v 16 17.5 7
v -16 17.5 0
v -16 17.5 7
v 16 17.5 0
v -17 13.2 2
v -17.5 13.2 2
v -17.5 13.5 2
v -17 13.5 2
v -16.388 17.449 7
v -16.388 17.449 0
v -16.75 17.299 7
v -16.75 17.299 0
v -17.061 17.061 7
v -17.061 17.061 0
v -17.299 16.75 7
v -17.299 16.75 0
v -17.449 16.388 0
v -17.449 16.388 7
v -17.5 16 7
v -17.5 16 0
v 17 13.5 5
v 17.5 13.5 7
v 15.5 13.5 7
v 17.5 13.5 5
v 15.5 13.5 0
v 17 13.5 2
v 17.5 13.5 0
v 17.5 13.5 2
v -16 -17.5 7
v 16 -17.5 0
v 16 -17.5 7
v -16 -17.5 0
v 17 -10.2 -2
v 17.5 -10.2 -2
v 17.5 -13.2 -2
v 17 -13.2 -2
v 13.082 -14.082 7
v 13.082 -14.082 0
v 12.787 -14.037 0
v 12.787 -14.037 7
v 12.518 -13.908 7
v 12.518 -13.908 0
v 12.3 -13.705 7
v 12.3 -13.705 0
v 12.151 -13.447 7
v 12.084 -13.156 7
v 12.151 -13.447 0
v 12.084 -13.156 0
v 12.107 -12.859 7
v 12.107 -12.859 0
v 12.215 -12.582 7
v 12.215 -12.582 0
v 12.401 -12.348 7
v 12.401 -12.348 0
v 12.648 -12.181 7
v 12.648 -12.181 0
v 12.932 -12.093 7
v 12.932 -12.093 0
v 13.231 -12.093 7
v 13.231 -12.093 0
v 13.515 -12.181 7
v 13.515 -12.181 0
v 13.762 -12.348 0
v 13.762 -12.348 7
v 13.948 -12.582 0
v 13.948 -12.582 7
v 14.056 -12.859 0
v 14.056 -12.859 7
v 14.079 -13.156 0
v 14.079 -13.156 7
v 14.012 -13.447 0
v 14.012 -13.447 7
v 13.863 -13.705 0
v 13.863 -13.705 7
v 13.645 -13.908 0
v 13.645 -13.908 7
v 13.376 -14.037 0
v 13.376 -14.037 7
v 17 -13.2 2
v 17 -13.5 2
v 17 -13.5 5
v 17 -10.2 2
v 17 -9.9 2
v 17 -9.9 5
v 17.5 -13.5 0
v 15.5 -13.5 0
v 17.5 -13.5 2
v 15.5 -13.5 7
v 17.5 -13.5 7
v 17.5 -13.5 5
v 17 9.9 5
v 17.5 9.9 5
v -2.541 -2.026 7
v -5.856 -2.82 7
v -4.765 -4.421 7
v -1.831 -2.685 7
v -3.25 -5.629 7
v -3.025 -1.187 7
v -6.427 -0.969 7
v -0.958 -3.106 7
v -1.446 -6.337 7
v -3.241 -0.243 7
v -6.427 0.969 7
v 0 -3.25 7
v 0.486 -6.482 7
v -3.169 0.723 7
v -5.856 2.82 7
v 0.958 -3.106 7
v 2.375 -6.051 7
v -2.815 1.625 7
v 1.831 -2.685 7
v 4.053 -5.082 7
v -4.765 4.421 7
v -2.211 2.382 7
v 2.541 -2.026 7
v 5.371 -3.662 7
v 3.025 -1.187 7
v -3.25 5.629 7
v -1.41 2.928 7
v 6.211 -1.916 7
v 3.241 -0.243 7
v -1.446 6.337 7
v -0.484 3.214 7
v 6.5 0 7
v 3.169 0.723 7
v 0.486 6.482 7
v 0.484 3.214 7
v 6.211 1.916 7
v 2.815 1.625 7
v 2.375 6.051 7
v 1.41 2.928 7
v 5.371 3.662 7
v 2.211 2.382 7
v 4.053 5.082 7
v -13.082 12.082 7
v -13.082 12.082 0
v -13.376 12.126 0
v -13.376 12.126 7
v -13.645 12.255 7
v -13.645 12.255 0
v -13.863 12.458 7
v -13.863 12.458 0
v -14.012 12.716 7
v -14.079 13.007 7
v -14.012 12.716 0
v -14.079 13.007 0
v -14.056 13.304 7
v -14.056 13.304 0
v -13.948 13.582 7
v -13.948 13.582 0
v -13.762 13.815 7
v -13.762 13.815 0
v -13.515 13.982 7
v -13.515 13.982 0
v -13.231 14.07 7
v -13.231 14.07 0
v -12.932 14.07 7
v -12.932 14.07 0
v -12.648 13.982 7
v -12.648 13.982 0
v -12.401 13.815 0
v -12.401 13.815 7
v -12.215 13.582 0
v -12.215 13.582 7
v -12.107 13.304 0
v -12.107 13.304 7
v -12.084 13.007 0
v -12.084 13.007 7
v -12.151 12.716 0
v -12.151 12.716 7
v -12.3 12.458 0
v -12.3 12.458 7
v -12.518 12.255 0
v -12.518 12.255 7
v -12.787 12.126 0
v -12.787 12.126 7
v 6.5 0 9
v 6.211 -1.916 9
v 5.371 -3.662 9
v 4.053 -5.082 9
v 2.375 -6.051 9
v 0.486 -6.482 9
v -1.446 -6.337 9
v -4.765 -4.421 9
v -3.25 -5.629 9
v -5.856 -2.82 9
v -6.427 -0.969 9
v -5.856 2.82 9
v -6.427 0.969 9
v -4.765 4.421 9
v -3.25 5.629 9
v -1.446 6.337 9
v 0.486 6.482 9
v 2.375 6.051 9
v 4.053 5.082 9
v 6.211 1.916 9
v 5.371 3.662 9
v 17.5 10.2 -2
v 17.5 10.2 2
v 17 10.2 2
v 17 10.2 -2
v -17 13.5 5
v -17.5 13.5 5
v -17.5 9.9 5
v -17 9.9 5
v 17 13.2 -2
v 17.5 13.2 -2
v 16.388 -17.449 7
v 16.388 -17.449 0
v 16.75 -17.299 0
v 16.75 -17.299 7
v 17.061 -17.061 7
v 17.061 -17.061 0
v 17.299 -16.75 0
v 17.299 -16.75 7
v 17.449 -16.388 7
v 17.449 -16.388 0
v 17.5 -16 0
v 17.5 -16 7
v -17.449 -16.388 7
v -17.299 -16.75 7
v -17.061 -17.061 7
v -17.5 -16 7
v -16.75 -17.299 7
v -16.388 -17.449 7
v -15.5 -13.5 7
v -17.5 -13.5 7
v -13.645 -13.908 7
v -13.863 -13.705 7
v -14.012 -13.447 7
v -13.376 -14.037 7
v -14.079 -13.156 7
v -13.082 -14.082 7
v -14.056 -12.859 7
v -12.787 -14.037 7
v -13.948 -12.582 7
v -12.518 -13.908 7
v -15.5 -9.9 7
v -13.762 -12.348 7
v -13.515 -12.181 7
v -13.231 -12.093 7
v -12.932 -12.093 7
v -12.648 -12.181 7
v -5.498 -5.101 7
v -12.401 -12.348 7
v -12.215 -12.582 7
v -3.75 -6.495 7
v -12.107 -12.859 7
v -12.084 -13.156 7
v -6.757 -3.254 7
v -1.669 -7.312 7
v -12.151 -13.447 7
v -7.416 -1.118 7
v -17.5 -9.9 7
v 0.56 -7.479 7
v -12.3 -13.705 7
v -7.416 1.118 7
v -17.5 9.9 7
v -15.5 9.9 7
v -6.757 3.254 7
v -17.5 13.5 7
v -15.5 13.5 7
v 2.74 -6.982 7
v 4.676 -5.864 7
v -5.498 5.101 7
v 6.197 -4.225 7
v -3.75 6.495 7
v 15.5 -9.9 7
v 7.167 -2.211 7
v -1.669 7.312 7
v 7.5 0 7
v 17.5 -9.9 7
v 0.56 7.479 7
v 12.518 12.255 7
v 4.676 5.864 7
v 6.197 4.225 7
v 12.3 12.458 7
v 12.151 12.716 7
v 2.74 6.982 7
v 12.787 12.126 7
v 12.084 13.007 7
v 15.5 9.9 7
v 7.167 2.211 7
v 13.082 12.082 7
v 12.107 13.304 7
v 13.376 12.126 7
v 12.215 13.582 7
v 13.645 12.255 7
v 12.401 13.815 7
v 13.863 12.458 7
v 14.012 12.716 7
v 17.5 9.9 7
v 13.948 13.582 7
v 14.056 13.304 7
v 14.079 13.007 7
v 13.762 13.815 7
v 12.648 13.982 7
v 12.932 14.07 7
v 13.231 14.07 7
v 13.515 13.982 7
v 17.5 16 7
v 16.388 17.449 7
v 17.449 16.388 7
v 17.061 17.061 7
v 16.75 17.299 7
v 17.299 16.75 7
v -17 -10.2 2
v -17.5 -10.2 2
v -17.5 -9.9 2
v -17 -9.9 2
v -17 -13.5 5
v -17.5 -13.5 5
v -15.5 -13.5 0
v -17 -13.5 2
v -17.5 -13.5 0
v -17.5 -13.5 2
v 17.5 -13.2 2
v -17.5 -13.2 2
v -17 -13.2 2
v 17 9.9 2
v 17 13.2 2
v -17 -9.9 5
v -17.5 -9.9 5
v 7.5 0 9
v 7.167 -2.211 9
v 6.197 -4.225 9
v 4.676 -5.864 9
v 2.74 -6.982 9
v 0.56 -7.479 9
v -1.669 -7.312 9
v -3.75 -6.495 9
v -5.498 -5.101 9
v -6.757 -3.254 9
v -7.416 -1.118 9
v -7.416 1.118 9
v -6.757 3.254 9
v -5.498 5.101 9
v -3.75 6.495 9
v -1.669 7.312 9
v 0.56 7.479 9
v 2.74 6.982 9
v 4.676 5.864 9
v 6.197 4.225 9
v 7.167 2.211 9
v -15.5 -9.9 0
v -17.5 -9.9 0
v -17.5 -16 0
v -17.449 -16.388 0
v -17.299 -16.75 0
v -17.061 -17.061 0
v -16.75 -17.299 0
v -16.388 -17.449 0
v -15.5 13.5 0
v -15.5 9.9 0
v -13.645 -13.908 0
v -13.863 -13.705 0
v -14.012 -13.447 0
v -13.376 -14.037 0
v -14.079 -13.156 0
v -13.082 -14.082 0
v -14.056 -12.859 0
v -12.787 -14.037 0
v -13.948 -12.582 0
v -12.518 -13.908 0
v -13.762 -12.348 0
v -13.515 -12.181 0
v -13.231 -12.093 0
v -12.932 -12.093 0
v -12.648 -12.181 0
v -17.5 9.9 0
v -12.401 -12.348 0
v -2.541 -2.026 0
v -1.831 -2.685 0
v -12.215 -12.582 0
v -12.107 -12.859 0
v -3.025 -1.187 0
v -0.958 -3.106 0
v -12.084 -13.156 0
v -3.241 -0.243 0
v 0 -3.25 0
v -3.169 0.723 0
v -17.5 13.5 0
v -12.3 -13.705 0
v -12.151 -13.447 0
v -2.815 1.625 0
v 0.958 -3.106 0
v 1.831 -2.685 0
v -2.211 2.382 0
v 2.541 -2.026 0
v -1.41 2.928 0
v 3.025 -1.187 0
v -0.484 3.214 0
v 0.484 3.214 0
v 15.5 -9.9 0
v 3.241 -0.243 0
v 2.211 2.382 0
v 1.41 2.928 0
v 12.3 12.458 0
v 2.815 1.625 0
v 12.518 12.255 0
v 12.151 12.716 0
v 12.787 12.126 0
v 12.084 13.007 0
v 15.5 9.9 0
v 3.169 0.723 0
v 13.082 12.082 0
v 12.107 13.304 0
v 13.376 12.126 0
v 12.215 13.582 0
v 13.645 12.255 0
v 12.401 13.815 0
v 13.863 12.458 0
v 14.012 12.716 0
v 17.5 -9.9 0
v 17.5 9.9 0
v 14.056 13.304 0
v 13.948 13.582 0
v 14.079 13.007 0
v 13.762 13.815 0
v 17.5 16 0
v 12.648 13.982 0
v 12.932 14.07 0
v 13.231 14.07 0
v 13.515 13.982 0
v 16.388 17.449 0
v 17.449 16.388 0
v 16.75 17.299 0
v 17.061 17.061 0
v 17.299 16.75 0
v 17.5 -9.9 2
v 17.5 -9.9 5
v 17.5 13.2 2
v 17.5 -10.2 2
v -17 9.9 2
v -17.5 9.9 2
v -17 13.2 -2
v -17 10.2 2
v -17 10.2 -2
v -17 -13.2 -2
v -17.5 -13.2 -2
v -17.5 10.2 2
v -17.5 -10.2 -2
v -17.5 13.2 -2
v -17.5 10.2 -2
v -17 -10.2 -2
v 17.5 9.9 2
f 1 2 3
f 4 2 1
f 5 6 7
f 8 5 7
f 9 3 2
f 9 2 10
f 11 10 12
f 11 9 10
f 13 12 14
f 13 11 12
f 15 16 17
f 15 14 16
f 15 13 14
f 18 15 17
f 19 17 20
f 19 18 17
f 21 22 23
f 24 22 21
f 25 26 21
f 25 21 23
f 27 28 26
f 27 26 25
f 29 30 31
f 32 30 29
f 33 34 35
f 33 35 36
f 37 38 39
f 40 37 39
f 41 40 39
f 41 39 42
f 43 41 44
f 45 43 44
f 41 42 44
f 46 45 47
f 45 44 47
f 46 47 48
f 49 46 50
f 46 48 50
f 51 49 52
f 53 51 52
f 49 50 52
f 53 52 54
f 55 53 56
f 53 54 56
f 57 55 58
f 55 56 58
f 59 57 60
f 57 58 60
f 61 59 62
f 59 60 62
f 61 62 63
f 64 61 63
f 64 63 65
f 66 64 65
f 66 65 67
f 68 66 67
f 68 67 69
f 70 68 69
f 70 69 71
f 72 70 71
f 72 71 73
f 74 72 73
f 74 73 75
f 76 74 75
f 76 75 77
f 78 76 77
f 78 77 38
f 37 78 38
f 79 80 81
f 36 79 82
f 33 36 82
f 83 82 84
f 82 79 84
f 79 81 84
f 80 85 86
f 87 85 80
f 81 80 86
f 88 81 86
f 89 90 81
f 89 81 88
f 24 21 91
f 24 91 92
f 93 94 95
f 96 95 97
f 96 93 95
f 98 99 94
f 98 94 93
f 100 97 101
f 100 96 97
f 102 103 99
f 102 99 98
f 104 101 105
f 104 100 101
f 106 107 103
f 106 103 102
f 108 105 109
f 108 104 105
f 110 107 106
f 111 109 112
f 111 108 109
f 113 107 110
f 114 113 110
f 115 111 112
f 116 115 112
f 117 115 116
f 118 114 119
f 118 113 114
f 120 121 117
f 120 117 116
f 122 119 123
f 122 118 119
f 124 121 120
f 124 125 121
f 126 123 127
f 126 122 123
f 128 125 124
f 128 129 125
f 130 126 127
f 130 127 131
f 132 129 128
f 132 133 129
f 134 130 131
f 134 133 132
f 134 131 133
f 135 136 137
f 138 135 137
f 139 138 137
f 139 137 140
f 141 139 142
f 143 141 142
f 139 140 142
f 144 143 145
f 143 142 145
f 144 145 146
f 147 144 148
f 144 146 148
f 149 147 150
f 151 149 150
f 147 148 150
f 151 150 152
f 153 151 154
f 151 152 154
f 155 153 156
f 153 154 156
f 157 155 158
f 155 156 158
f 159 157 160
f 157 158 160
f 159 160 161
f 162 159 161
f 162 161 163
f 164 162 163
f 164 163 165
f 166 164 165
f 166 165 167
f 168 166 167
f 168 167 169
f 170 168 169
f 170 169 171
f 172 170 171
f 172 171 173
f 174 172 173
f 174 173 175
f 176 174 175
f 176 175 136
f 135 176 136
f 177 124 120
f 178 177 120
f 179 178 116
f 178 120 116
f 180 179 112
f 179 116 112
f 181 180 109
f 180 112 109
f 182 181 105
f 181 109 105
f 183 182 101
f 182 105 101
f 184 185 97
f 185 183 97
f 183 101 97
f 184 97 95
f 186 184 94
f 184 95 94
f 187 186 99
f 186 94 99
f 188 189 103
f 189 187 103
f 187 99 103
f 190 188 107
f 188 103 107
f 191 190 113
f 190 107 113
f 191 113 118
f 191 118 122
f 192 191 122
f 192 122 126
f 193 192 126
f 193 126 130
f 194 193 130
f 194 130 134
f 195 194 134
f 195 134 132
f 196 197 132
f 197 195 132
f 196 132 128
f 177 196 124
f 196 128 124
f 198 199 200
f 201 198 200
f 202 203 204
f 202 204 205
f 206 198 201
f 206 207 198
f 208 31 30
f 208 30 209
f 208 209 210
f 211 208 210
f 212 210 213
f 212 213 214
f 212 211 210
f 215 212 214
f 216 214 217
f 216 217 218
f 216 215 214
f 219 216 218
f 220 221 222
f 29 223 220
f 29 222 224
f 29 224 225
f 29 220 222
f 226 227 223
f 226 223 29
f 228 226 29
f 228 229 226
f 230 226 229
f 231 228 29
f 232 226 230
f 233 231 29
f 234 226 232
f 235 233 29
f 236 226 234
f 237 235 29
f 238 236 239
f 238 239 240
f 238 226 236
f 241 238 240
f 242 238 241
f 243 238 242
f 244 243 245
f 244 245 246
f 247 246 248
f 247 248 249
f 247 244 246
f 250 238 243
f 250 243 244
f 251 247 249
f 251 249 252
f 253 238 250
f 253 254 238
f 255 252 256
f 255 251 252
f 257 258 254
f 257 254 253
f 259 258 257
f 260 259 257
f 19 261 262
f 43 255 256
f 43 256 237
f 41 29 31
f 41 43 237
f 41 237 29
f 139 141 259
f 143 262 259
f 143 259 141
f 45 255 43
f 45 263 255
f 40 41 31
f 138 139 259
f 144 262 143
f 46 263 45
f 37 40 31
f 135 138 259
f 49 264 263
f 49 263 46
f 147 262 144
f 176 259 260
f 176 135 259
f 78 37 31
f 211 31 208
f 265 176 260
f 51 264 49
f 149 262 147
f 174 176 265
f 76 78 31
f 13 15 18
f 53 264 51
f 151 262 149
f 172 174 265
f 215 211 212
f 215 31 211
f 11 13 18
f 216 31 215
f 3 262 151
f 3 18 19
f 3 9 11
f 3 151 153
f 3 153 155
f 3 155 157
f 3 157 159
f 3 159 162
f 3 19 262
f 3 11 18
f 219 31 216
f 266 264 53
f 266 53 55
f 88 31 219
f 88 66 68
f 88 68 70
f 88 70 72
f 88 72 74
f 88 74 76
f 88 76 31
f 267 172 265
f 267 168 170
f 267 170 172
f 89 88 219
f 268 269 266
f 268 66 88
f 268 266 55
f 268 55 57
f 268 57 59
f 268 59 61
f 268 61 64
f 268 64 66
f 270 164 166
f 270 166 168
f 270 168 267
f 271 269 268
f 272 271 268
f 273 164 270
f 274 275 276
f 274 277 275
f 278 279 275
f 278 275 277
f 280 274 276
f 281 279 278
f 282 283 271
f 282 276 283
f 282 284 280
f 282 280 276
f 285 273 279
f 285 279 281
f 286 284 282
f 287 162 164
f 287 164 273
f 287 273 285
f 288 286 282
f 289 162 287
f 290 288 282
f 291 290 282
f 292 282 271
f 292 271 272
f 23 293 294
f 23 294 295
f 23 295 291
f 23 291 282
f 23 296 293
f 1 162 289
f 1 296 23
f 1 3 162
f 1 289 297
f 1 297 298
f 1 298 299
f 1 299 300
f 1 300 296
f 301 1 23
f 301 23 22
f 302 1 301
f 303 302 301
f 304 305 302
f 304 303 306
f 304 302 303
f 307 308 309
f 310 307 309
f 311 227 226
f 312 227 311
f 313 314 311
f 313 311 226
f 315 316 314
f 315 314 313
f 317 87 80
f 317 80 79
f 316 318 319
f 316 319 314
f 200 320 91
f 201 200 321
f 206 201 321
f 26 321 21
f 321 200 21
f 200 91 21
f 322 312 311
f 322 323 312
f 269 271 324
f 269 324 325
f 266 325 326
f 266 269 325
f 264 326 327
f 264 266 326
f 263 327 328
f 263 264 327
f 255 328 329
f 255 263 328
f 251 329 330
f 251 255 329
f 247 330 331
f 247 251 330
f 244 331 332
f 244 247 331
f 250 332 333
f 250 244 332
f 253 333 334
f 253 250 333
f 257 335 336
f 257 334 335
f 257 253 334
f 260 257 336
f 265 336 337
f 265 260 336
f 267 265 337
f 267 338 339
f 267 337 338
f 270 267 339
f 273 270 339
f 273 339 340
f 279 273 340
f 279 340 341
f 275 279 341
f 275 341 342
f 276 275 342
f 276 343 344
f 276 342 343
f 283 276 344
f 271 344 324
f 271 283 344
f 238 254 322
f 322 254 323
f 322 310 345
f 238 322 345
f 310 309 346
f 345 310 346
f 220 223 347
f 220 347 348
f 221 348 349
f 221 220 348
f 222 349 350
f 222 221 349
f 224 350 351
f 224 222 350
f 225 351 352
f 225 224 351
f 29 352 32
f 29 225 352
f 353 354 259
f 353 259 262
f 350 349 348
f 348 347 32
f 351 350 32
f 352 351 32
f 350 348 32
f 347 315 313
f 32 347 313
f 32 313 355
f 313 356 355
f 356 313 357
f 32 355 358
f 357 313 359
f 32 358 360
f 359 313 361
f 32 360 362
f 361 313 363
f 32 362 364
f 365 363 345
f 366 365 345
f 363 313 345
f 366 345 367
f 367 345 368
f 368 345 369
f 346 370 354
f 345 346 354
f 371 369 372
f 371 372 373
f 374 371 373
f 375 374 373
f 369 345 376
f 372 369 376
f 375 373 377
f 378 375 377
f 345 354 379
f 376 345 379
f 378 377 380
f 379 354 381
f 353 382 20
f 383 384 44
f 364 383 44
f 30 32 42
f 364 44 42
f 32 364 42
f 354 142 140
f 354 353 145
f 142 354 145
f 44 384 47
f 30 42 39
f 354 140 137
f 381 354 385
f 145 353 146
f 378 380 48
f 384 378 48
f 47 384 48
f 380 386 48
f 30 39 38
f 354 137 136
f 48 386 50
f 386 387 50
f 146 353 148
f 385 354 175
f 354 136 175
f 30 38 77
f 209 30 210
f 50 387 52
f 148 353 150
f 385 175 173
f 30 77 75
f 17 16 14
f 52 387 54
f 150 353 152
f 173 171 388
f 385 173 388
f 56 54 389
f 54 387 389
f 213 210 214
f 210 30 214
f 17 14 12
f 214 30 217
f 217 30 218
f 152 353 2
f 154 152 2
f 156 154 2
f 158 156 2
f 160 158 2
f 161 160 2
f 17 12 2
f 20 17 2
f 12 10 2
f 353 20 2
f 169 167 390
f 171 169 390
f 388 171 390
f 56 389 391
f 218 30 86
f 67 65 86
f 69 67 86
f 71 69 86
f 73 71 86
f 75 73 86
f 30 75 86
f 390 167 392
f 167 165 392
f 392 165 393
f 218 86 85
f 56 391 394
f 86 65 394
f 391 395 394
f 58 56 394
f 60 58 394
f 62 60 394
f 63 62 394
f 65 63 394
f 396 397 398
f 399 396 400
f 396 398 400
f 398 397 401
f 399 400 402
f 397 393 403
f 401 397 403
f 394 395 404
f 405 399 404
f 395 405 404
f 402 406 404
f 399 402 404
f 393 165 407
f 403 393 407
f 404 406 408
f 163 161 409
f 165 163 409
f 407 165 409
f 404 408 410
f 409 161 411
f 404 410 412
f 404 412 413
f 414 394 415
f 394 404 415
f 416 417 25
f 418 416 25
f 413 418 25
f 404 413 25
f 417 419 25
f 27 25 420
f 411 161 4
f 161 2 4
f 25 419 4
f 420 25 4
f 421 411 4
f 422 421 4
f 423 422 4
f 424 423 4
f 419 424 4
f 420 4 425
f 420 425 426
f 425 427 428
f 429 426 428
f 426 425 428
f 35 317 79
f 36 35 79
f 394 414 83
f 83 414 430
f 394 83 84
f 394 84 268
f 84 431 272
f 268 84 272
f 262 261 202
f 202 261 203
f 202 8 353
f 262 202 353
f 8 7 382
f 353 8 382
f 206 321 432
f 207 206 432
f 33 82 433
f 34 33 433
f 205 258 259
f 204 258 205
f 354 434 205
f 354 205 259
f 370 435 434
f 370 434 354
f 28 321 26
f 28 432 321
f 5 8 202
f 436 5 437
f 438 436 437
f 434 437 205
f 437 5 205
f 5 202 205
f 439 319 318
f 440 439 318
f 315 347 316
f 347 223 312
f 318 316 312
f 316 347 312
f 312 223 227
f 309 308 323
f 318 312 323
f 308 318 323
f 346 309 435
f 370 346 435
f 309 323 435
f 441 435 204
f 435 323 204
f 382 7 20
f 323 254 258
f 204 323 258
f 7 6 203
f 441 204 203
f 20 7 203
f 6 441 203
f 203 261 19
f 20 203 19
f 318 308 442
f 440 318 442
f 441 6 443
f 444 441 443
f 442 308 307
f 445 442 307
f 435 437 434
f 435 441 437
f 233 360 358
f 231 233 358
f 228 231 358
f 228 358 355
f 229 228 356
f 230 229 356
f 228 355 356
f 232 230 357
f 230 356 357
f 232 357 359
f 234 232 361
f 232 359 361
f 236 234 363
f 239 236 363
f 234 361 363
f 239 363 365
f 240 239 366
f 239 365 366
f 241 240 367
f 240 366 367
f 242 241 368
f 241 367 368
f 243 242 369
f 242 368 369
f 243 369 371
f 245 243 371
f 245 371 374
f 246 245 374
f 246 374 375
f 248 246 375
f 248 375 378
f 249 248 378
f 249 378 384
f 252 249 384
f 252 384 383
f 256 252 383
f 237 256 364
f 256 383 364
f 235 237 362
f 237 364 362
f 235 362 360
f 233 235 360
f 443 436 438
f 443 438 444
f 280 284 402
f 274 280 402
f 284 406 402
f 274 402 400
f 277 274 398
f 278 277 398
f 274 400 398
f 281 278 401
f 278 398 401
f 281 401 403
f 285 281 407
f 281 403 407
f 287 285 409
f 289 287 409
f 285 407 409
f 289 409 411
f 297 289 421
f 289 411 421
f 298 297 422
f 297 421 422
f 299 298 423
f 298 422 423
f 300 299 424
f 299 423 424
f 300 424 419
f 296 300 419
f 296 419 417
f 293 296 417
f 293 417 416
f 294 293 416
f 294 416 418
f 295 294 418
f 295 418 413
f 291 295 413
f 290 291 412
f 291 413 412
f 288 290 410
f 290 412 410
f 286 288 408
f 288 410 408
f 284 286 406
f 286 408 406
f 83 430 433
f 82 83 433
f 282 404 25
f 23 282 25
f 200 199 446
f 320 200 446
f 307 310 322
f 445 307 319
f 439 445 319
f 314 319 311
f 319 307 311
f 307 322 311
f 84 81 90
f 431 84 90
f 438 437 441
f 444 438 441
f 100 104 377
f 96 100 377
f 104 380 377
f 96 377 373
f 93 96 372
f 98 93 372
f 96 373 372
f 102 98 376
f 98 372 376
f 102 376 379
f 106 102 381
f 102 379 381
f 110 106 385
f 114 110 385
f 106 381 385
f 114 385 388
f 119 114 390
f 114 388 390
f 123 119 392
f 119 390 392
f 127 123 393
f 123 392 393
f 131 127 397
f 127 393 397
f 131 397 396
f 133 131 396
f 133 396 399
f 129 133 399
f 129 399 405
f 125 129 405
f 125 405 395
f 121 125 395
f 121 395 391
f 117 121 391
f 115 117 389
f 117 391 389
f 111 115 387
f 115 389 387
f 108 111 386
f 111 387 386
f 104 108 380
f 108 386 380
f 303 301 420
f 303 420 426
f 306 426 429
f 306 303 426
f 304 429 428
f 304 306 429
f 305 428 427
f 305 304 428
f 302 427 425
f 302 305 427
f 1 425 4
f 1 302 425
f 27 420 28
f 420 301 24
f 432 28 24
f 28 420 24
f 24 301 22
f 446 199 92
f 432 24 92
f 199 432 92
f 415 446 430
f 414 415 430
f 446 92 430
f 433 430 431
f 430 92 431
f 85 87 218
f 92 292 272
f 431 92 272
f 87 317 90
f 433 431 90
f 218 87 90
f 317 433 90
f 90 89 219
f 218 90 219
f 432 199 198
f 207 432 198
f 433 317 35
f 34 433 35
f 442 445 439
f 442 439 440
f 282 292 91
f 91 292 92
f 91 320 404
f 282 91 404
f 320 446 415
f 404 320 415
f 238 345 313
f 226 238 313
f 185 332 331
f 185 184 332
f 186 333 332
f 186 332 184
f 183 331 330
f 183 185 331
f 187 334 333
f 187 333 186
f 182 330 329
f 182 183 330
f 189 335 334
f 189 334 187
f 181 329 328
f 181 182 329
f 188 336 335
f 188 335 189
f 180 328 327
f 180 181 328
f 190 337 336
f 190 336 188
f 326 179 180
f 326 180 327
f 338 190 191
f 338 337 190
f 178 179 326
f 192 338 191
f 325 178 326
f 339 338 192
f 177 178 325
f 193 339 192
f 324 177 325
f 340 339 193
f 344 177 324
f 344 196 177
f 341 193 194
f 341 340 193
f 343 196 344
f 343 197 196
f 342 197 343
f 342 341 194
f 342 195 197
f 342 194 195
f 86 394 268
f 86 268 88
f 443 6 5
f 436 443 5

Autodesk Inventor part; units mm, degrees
ref_plane "YZ Plane" through (0, 0, 0) normal (1, 0, 0) x (0, 1, 0)
ref_plane "XZ Plane" through (0, 0, 0) normal (0, 1, 0) x (-1, 0, 0)
ref_plane "XY Plane" through (0, 0, 0) normal (0, 0, 1) x (1, 0, 0)
sketch "スケッチ1" plane through (0, 0, 0) normal (0, 0, 1) x (1, 0, 0)
  line L0 (-17.5, 17.5) -> (17.5, 17.5)
  line L1 (17.5, 17.5) -> (17.5, -17.5)
  line L2 (17.5, -17.5) -> (-17.5, -17.5)
  line L3 (-17.5, -17.5) -> (-17.5, 17.5)
  point P0 (0, 0)
  dimension "d0" = 35
  dimension "d1" = 35
  dimension "d2" = 17.5
  dimension "d3" = 17.5
extrude "押し出し1" add sketch "スケッチ1" along normal blind 7
sketch "スケッチ2" plane through (0, 0, 7) normal (0, 0, 1) x (1, 0, 0)
  line L0 (-17.5, 17.5) -> (17.5, -17.5)
  line L1 (17.5, 17.5) -> (-17.5, -17.5)
  line L2 (-17.5, -17.5) -> (-17.5, 17.5) projected
  circle A0 centre (0, 0) radius 18.5
  point P0 (-13.0815, 13.0815)
  point P1 (13.0815, 13.0815)
  point P2 (13.0815, -13.0815)
  point P3 (-13.0815, -13.0815)
  dimension "d6" = 37
hole "Hole1" at (-13.0815, 13.0815, 7) at (13.0815, 13.0815, 7) at (13.0815, -13.0815, 7) at (-13.0815, -13.0815, 7) direction (0, 0, -1) diameter 2 end through all
sketch "スケッチ3" plane through (0, 0, 7) normal (0, 0, 1) x (1, 0, 0)
  circle A0 centre (0, 0) radius 7.5
  circle A1 centre (0, 0) radius 6.5
  dimension "d14" = 15
  dimension "d15" = 13
extrude "押し出し2" add sketch "スケッチ3" along normal blind 2
sketch "スケッチ4" plane through (0, 0, 7) normal (0, 0, 1) x (1, 0, 0)
  line L0 (17.5, 17.5) -> (17.5, -17.5) projected
  line L1 (-17.5, 17.5) -> (17.5, 17.5) projected
  line L2 (-17.5, -17.5) -> (-17.5, 17.5) projected
  line L3 (17.5, -17.5) -> (-17.5, -17.5) projected
  line L4 (17.5, 13.5) -> (15.5, 13.5)
  line L5 (15.5, 13.5) -> (15.5, 9.9)
  line L6 (15.5, 9.9) -> (17.5, 9.9)
  line L7 (17.5, 9.9) -> (17.5, 13.5)
  line L8 (17.5, 0) -> (-17.5, 0)
  line L9 (17.5, -17.5) -> (17.5, 17.5)
  line L10 (17.5, -13.5) -> (15.5, -13.5)
  line L11 (15.5, -13.5) -> (15.5, -9.9)
  line L12 (15.5, -9.9) -> (17.5, -9.9)
  line L13 (17.5, -9.9) -> (17.5, -13.5)
  line L14 (0, 17.5) -> (0, -17.5)
  line L15 (-17.5, 17.5) -> (-17.5, -17.5)
  line L16 (-17.5, 13.5) -> (-15.5, 13.5)
  line L17 (-15.5, 13.5) -> (-15.5, 9.9)
  line L18 (-15.5, 9.9) -> (-17.5, 9.9)
  line L19 (-17.5, 9.9) -> (-17.5, 13.5)
  line L20 (-17.5, -17.5) -> (-17.5, 17.5)
  line L21 (-15.5, -13.5) -> (-15.5, -9.9)
  line L22 (-15.5, -9.9) -> (-17.5, -9.9)
  line L23 (-17.5, -9.9) -> (-17.5, -13.5)
  line L24 (-17.5, -13.5) -> (-15.5, -13.5)
  dimension "d18" = 4
  dimension "d19" = 2
  dimension "d20" = 3.6
extrude "押し出し3" cut sketch "スケッチ4" against normal blind 2 contours L0 L6 L5 L4 | L16 L17 L18 L2 | L0 L10 L11 L12 | L22 L21 L24 L2
sketch "スケッチ5" plane through (0, 0, 0) normal (0, 0, -1) x (-1, 0, 0)
  line L0 (17.5, 17.5) -> (-17.5, 17.5) projected
  line L1 (-17.5, 17.5) -> (-17.5, -17.5) projected
  line L2 (-17.5, -17.5) -> (17.5, -17.5) projected
  line L3 (17.5, 0) -> (-17.5, 0)
  line L4 (17.5, 17.5) -> (-17.5, 17.5) projected
  line L5 (0, 17.5) -> (0, -17.5)
  line L6 (15.5, 13.5) -> (17, 13.5)
  line L7 (17, 13.5) -> (17, 9.9)
  line L8 (17, 9.9) -> (15.5, 9.9)
  line L9 (15.5, 9.9) -> (15.5, 13.5)
  line L10 (17.5, -17.5) -> (17.5, 17.5) projected
  line L11 (15.5, -13.5) -> (17, -13.5)
  line L12 (17, -13.5) -> (17, -9.9)
  line L13 (17, -9.9) -> (15.5, -9.9)
  line L14 (15.5, -9.9) -> (15.5, -13.5)
  line L15 (-15.5, 13.5) -> (-17, 13.5)
  line L16 (-17, 13.5) -> (-17, 9.9)
  line L17 (-17, 9.9) -> (-15.5, 9.9)
  line L18 (-15.5, 9.9) -> (-15.5, 13.5)
  line L19 (-15.5, -13.5) -> (-17, -13.5)
  line L20 (-17, -13.5) -> (-17, -9.9)
  line L21 (-17, -9.9) -> (-15.5, -9.9)
  line L22 (-15.5, -9.9) -> (-15.5, -13.5)
  line L23 (17, 13.5) -> (15.5, 13.5)
  line L24 (15.5, 13.5) -> (15.5, 9.9)
  line L25 (15.5, 9.9) -> (17, 9.9)
  line L26 (17, 9.9) -> (17, 13.5)
  point P0 (0, 0)
  dimension "d26" = 4
  dimension "d27" = 3.6
  dimension "d28" = 2
  dimension "d29" = 1.5
extrude "押し出し4" cut sketch "スケッチ5" against normal through all contours L6 L7 L8 L9 | L14 L13 L12 L11 | L18 L17 L16 L15 | L19 L20 L21 L22
sketch "スケッチ6" plane through (-17.5, -17.5, 0) normal (-1, 0, 0) x (0, 0, 1)
  line L0 (0, 0) -> (0, 35) projected
  line L1 (0, 35) -> (0, 0) projected
  line L2 (2, 31) -> (0, 31)
  line L3 (0, 31) -> (0, 30.7)
  line L4 (0, 30.7) -> (2, 30.7)
  line L5 (2, 30.7) -> (2, 31)
  line L6 (2, 27.4) -> (0, 27.4)
  line L7 (0, 27.4) -> (0, 27.7)
  line L8 (0, 27.7) -> (2, 27.7)
  line L9 (2, 27.7) -> (2, 27.4)
  line L10 (7, 27.4) -> (7, 7.6) projected
  line L11 (7, 17.5) -> (0, 17.5)
  line L12 (0, 0) -> (0, 35)
  line L13 (2, 4) -> (0, 4)
  line L14 (0, 4) -> (0, 4.3)
  line L15 (0, 4.3) -> (2, 4.3)
  line L16 (2, 4.3) -> (2, 4)
  line L17 (2, 7.6) -> (0, 7.6)
  line L18 (0, 7.6) -> (0, 7.3)
  line L19 (0, 7.3) -> (2, 7.3)
  line L20 (2, 7.3) -> (2, 7.6)
  dimension "d32" = 3
  dimension "d33" = 0.3
  dimension "d34" = 2
extrude "押し出し5" cut sketch "スケッチ6" against normal blind 2
sketch "スケッチ7" plane through (17.5, -17.5, 0) normal (1, 0, 0) x (0, 0, -1)
  line L0 (-7, 27.4) -> (-7, 7.6) projected
  line L1 (-7, 17.5) -> (0, 17.5)
  line L2 (-2, 4.3) -> (0, 4.3)
  line L3 (0, 4.3) -> (0, 4)
  line L4 (0, 4) -> (-2, 4)
  line L5 (-2, 4) -> (-2, 4.3)
  line L6 (-2, 27.4) -> (0, 27.4)
  line L7 (0, 27.4) -> (0, 27.7)
  line L8 (0, 27.7) -> (-2, 27.7)
  line L9 (-2, 27.7) -> (-2, 27.4)
  line L10 (-2, 31) -> (0, 31)
  line L11 (0, 31) -> (0, 30.7)
  line L12 (0, 30.7) -> (-2, 30.7)
  line L13 (-2, 30.7) -> (-2, 31)
  line L14 (0, 7.6) -> (-2, 7.6)
  line L15 (-2, 7.6) -> (-2, 7.3)
  line L16 (-2, 7.3) -> (0, 7.3)
  line L17 (0, 7.3) -> (0, 7.6)
  dimension "d40" = 0.3
extrude "押し出し6" cut sketch "スケッチ7" against normal blind 2
sketch "スケッチ8" plane through (0, 0, 0) normal (0, 0, -1) x (-1, 0, 0)
  line L0 (-17, 13.2) -> (-17.5, 13.2) projected
  line L1 (-17.5, 13.2) -> (-17.5, 10.2) projected
  line L2 (-17.5, 10.2) -> (-17, 10.2) projected
  line L3 (-17, 10.2) -> (-17, 13.2) projected
  point P0 (0, 0)
extrude "押し出し7" add sketch "スケッチ8" along normal blind 2
sketch "スケッチ9" plane through (0, 0, 0) normal (0, 0, -1) x (-1, 0, 0)
  line L0 (-17, -10.2) -> (-17.5, -10.2) projected
  line L1 (-17.5, -10.2) -> (-17.5, -13.2) projected
  line L2 (-17.5, -13.2) -> (-17, -13.2) projected
  line L3 (-17, -13.2) -> (-17, -10.2) projected
  point P0 (0, 0)
extrude "押し出し8" add sketch "スケッチ9" along normal blind 2
sketch "スケッチ10" plane through (0, 0, 0) normal (0, 0, -1) x (-1, 0, 0)
  line L0 (17, -13.2) -> (17.5, -13.2) projected
  line L1 (17.5, -13.2) -> (17.5, -10.2) projected
  line L2 (17.5, -10.2) -> (17, -10.2) projected
  line L3 (17, -10.2) -> (17, -13.2) projected
  point P0 (0, 0)
extrude "押し出し9" add sketch "スケッチ10" along normal blind 2
sketch "スケッチ11" plane through (0, 0, 0) normal (0, 0, -1) x (-1, 0, 0)
  line L0 (17.5, 13.2) -> (17, 13.2) projected
  line L1 (17, 13.2) -> (17, 10.2) projected
  line L2 (17, 10.2) -> (17.5, 10.2) projected
  line L3 (17.5, 10.2) -> (17.5, 13.2) projected
  point P0 (0, 0)
extrude "押し出し10" add sketch "スケッチ11" along normal blind 2
fillet "フィレット2" radius 1.5 4 edges at (17.5, -17.5, 3.5) (-17.5, -17.5, 3.5) (-17.5, 17.5, 3.5) (17.5, 17.5, 3.5)
sketch "スケッチ14" plane through (0, 0, 7) normal (0, 0, 1) x (1, 0, 0)
  circle A0 centre (0, 0) radius 6.5 projected
hole "Hole3" at (0, 0, 7) direction (0, 0, -1) diameter 6.5 end through all
equation "\"d1\" = d0"
equation "\"d2\" = 0.5 * d0"
equation "\"d3\" = d2"
properties part number "SLIPRING_SRG-1-6G"
